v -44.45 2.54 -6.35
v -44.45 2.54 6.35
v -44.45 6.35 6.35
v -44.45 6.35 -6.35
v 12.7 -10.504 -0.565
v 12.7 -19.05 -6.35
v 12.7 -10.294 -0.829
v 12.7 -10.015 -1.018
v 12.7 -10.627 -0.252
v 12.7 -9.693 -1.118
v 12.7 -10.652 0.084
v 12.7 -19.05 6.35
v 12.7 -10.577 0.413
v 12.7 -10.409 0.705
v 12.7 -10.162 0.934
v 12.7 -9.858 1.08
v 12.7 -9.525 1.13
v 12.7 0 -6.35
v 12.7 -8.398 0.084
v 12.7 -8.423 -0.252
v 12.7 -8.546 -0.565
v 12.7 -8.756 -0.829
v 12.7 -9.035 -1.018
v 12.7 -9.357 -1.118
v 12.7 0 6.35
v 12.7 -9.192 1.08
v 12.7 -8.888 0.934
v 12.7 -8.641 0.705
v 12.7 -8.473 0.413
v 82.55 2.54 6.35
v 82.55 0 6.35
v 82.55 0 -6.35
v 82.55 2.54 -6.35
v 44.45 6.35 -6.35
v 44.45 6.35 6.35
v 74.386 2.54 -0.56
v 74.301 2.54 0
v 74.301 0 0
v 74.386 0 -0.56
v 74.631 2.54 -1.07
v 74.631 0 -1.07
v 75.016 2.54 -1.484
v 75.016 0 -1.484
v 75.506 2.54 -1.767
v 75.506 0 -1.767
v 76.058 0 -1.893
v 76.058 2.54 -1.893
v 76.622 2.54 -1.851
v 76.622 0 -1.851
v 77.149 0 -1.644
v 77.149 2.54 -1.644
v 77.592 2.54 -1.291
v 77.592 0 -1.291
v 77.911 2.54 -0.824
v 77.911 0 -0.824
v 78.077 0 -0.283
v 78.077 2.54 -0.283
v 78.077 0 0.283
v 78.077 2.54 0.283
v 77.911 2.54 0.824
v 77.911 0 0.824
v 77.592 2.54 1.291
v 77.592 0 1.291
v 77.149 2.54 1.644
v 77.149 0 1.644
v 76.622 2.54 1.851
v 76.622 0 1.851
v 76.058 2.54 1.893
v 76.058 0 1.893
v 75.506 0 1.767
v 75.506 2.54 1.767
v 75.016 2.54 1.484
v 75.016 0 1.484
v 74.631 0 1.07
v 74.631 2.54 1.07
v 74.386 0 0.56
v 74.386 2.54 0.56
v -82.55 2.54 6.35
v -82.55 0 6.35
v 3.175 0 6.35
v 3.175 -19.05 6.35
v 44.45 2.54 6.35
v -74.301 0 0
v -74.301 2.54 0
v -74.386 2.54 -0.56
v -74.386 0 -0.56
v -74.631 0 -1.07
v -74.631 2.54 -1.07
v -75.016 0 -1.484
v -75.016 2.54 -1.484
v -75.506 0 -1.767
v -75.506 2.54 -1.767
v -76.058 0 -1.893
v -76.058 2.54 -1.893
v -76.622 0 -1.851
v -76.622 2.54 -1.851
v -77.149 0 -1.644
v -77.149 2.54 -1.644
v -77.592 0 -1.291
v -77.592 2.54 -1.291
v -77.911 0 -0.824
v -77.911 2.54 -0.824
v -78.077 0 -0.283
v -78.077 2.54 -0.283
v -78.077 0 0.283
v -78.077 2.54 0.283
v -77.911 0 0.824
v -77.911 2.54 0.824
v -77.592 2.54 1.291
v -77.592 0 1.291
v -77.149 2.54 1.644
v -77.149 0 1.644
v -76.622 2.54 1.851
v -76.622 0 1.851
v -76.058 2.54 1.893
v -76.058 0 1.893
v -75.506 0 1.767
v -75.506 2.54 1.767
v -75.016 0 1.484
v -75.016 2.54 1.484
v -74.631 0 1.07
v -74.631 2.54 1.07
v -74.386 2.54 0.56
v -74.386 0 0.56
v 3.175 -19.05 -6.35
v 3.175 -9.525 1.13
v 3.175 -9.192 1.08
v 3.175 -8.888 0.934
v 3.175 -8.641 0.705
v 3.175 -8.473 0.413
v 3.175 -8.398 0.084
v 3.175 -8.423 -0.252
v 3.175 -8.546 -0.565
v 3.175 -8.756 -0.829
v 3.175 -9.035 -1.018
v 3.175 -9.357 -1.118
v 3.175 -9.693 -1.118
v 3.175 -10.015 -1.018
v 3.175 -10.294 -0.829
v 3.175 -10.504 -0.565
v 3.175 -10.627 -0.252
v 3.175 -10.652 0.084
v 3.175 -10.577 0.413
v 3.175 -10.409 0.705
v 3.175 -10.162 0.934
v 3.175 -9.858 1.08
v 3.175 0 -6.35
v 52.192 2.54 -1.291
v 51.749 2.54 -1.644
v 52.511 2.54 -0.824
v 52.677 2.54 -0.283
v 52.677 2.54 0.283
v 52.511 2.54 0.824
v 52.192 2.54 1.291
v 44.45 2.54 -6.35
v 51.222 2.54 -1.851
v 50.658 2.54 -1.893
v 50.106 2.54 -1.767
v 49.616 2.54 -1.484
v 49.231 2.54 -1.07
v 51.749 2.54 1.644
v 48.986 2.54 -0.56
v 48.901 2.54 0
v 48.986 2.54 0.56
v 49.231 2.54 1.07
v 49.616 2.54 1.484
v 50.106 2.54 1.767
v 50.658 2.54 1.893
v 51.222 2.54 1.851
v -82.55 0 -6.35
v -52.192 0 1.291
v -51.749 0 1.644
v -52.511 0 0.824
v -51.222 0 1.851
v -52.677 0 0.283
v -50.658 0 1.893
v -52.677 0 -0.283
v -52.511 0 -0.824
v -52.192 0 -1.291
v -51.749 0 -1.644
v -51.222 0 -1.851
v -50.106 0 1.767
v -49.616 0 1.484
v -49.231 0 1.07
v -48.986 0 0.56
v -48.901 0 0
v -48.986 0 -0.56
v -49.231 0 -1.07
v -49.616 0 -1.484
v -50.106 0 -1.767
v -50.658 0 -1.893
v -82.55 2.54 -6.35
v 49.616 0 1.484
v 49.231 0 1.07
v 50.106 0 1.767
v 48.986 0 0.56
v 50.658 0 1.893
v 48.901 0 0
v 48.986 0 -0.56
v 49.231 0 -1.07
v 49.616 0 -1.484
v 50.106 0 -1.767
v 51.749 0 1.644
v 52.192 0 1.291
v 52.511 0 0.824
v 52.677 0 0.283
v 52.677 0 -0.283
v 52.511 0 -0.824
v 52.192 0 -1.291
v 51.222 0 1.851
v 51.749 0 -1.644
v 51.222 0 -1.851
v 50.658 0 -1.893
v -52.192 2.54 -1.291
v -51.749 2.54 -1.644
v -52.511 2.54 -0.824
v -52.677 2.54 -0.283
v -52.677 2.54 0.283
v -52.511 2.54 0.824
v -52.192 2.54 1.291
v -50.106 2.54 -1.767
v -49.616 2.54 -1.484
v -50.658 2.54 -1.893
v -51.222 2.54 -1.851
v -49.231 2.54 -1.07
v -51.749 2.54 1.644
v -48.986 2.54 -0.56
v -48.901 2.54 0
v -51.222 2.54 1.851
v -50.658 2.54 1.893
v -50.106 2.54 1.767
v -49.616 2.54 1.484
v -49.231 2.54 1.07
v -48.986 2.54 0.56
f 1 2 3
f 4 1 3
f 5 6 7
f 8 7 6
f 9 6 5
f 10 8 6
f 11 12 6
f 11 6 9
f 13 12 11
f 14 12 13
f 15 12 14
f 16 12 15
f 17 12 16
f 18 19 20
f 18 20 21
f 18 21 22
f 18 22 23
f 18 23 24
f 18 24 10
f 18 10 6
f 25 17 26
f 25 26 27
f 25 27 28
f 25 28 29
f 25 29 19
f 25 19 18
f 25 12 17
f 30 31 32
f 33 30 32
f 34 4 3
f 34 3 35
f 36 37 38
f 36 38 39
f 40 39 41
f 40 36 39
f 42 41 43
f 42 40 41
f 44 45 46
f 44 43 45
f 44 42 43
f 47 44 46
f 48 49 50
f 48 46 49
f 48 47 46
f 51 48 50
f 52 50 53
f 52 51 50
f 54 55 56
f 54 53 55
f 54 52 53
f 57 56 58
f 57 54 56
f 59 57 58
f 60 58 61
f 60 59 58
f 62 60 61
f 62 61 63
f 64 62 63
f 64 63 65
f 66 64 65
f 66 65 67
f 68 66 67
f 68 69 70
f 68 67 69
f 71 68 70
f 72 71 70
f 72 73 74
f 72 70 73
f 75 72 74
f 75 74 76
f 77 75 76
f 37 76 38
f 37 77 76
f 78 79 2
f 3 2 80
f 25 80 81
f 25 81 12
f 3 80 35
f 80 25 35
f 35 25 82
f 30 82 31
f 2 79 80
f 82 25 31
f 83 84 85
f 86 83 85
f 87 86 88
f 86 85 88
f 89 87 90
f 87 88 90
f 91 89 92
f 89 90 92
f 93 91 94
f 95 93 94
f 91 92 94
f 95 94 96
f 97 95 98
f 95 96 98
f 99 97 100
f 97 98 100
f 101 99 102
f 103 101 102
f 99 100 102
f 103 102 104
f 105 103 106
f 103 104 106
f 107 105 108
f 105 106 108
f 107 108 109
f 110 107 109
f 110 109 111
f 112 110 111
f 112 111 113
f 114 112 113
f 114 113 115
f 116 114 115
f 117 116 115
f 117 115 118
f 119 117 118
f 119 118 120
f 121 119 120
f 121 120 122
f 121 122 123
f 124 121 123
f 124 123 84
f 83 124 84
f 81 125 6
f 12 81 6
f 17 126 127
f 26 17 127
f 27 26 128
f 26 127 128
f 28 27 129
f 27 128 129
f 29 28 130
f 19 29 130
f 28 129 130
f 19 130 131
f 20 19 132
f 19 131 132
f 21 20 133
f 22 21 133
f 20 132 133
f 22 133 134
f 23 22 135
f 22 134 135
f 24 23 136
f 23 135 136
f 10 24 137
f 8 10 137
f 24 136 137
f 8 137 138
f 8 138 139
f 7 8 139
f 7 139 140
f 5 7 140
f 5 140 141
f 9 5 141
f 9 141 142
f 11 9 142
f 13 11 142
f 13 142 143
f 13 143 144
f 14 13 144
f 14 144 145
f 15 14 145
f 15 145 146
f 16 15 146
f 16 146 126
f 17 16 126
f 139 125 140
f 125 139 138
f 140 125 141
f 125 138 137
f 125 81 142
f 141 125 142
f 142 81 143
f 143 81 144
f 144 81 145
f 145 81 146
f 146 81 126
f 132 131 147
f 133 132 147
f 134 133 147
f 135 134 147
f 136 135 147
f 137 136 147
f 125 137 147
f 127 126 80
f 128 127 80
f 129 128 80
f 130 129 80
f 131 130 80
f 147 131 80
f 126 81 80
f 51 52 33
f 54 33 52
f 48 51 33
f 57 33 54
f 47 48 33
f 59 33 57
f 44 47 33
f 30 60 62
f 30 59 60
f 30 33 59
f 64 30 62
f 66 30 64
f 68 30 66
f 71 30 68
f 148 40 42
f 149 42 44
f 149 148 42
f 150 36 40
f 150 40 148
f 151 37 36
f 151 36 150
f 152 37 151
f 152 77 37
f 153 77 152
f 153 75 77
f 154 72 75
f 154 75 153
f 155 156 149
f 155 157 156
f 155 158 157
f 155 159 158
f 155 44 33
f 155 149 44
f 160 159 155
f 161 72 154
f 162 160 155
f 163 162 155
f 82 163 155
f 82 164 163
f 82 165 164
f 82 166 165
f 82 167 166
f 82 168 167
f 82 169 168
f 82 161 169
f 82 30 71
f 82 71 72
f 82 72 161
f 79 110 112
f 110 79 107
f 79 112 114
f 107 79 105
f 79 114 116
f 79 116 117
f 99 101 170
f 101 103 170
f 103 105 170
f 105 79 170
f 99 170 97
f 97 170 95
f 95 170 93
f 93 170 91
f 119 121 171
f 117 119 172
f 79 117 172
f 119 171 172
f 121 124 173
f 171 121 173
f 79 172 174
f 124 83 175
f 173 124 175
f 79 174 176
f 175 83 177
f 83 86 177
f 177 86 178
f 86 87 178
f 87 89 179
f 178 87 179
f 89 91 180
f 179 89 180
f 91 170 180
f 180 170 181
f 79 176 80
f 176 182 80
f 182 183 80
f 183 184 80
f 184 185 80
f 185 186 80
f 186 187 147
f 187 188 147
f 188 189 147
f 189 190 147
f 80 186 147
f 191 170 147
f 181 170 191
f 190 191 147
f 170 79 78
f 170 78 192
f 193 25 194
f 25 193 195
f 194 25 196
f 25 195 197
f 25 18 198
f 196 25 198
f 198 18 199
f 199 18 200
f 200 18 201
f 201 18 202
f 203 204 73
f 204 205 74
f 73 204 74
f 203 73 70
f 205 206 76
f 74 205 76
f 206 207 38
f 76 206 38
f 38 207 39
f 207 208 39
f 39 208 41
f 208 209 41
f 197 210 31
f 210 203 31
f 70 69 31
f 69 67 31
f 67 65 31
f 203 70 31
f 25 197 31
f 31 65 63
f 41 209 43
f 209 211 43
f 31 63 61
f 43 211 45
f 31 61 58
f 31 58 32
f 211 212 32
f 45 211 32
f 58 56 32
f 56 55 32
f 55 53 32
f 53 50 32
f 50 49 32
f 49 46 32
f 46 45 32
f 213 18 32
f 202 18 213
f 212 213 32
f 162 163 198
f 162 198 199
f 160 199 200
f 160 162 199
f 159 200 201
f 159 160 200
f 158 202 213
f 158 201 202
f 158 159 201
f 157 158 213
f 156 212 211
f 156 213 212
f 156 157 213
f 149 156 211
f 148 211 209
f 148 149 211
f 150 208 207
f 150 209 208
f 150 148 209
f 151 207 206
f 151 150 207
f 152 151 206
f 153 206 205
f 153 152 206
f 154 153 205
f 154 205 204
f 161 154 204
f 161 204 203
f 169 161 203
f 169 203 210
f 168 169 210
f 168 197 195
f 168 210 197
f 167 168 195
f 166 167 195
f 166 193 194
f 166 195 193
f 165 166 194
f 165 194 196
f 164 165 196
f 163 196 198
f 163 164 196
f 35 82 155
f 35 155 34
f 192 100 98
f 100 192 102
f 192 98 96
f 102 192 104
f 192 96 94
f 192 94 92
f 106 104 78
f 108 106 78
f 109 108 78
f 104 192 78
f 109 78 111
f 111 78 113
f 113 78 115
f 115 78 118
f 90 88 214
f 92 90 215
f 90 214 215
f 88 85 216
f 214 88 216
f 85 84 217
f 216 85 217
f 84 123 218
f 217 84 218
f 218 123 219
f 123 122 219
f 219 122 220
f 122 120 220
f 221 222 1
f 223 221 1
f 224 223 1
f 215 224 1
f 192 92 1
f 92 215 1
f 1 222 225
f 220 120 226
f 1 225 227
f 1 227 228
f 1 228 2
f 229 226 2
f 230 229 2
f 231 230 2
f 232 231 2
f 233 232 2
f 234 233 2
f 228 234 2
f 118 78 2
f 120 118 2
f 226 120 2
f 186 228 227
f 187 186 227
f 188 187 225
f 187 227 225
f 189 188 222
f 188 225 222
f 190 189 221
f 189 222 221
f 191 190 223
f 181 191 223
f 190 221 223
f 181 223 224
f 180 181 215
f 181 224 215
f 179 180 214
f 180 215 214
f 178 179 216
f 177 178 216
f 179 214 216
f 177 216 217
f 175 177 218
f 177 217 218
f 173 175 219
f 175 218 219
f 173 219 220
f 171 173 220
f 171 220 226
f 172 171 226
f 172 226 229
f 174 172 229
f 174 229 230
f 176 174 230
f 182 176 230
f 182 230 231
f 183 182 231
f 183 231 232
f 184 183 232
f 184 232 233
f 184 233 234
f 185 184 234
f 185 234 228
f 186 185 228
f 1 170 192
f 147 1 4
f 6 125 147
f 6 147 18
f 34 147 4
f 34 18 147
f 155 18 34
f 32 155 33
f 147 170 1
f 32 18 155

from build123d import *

# Parameters (mm, degrees)
SKETCH1_W             = 165.1
SKETCH1_H             = 12.7
BOSS_EXTRUDE1_DEPTH   = 6.35
SKETCH2_W             = 38.1
SKETCH2_H             = 3.81
CUT_EXTRUDE1_DEPTH    = 84.762252835
F_6_CLEARANCE_HOLE1_D = 3.7973
SKETCH6_W             = 9.525
SKETCH6_H             = 19.05
BOSS_EXTRUDE2_DEPTH   = 12.7
F_4_40_TAPPED_HOLE1_D = 2.2606


with BuildPart() as part:
    # Sketch1 → Boss-Extrude1 (new body)
    with BuildSketch(Plane(origin=(0, 0, 0), x_dir=(1, 0, 0), z_dir=(0, 1, 0))):
        Rectangle(SKETCH1_W, SKETCH1_H)
    extrude(amount=BOSS_EXTRUDE1_DEPTH)

    # Sketch2 → Cut-Extrude1 (cut, through all)
    with BuildSketch(Plane.XY.offset(6.35)):
        with Locations((-63.5, 4.445)):
            Rectangle(SKETCH2_W, SKETCH2_H)
    cut_extrude1 = extrude(amount=-CUT_EXTRUDE1_DEPTH, mode=Mode.SUBTRACT)

    # #6 Clearance Hole1 (through all)
    with Locations(Plane(origin=(0, 0, 0), x_dir=(-1, 0, 0), z_dir=(0, -1, 0))):
        with Locations((50.8, 0), (76.2, 0)):
            f_6_clearance_hole1 = Hole(F_6_CLEARANCE_HOLE1_D / 2)

    # Mirror1: Cut-Extrude1, #6 Clearance Hole1 across plane
    add(cut_extrude1.mirror(Plane(origin=(0, 0, 0), x_dir=(0, 0, 1), z_dir=(1, 0, 0))), mode=Mode.SUBTRACT)
    add(f_6_clearance_hole1.mirror(Plane(origin=(0, 0, 0), x_dir=(0, 0, 1), z_dir=(1, 0, 0))), mode=Mode.SUBTRACT)

    # Sketch6 → Boss-Extrude2 (add)
    with BuildSketch(Plane.XY.offset(6.35)):
        with Locations((7.9375, -9.525)):
            Rectangle(SKETCH6_W, SKETCH6_H)
    extrude(amount=-BOSS_EXTRUDE2_DEPTH)

    # #4-40 Tapped Hole1 (through all)
    with Locations(Plane(origin=(12.7, 0, 0), x_dir=(0, 0, -1), z_dir=(1, 0, 0))):
        with Locations((0, -9.525)):
            Hole(F_4_40_TAPPED_HOLE1_D / 2)


solid = part.part
